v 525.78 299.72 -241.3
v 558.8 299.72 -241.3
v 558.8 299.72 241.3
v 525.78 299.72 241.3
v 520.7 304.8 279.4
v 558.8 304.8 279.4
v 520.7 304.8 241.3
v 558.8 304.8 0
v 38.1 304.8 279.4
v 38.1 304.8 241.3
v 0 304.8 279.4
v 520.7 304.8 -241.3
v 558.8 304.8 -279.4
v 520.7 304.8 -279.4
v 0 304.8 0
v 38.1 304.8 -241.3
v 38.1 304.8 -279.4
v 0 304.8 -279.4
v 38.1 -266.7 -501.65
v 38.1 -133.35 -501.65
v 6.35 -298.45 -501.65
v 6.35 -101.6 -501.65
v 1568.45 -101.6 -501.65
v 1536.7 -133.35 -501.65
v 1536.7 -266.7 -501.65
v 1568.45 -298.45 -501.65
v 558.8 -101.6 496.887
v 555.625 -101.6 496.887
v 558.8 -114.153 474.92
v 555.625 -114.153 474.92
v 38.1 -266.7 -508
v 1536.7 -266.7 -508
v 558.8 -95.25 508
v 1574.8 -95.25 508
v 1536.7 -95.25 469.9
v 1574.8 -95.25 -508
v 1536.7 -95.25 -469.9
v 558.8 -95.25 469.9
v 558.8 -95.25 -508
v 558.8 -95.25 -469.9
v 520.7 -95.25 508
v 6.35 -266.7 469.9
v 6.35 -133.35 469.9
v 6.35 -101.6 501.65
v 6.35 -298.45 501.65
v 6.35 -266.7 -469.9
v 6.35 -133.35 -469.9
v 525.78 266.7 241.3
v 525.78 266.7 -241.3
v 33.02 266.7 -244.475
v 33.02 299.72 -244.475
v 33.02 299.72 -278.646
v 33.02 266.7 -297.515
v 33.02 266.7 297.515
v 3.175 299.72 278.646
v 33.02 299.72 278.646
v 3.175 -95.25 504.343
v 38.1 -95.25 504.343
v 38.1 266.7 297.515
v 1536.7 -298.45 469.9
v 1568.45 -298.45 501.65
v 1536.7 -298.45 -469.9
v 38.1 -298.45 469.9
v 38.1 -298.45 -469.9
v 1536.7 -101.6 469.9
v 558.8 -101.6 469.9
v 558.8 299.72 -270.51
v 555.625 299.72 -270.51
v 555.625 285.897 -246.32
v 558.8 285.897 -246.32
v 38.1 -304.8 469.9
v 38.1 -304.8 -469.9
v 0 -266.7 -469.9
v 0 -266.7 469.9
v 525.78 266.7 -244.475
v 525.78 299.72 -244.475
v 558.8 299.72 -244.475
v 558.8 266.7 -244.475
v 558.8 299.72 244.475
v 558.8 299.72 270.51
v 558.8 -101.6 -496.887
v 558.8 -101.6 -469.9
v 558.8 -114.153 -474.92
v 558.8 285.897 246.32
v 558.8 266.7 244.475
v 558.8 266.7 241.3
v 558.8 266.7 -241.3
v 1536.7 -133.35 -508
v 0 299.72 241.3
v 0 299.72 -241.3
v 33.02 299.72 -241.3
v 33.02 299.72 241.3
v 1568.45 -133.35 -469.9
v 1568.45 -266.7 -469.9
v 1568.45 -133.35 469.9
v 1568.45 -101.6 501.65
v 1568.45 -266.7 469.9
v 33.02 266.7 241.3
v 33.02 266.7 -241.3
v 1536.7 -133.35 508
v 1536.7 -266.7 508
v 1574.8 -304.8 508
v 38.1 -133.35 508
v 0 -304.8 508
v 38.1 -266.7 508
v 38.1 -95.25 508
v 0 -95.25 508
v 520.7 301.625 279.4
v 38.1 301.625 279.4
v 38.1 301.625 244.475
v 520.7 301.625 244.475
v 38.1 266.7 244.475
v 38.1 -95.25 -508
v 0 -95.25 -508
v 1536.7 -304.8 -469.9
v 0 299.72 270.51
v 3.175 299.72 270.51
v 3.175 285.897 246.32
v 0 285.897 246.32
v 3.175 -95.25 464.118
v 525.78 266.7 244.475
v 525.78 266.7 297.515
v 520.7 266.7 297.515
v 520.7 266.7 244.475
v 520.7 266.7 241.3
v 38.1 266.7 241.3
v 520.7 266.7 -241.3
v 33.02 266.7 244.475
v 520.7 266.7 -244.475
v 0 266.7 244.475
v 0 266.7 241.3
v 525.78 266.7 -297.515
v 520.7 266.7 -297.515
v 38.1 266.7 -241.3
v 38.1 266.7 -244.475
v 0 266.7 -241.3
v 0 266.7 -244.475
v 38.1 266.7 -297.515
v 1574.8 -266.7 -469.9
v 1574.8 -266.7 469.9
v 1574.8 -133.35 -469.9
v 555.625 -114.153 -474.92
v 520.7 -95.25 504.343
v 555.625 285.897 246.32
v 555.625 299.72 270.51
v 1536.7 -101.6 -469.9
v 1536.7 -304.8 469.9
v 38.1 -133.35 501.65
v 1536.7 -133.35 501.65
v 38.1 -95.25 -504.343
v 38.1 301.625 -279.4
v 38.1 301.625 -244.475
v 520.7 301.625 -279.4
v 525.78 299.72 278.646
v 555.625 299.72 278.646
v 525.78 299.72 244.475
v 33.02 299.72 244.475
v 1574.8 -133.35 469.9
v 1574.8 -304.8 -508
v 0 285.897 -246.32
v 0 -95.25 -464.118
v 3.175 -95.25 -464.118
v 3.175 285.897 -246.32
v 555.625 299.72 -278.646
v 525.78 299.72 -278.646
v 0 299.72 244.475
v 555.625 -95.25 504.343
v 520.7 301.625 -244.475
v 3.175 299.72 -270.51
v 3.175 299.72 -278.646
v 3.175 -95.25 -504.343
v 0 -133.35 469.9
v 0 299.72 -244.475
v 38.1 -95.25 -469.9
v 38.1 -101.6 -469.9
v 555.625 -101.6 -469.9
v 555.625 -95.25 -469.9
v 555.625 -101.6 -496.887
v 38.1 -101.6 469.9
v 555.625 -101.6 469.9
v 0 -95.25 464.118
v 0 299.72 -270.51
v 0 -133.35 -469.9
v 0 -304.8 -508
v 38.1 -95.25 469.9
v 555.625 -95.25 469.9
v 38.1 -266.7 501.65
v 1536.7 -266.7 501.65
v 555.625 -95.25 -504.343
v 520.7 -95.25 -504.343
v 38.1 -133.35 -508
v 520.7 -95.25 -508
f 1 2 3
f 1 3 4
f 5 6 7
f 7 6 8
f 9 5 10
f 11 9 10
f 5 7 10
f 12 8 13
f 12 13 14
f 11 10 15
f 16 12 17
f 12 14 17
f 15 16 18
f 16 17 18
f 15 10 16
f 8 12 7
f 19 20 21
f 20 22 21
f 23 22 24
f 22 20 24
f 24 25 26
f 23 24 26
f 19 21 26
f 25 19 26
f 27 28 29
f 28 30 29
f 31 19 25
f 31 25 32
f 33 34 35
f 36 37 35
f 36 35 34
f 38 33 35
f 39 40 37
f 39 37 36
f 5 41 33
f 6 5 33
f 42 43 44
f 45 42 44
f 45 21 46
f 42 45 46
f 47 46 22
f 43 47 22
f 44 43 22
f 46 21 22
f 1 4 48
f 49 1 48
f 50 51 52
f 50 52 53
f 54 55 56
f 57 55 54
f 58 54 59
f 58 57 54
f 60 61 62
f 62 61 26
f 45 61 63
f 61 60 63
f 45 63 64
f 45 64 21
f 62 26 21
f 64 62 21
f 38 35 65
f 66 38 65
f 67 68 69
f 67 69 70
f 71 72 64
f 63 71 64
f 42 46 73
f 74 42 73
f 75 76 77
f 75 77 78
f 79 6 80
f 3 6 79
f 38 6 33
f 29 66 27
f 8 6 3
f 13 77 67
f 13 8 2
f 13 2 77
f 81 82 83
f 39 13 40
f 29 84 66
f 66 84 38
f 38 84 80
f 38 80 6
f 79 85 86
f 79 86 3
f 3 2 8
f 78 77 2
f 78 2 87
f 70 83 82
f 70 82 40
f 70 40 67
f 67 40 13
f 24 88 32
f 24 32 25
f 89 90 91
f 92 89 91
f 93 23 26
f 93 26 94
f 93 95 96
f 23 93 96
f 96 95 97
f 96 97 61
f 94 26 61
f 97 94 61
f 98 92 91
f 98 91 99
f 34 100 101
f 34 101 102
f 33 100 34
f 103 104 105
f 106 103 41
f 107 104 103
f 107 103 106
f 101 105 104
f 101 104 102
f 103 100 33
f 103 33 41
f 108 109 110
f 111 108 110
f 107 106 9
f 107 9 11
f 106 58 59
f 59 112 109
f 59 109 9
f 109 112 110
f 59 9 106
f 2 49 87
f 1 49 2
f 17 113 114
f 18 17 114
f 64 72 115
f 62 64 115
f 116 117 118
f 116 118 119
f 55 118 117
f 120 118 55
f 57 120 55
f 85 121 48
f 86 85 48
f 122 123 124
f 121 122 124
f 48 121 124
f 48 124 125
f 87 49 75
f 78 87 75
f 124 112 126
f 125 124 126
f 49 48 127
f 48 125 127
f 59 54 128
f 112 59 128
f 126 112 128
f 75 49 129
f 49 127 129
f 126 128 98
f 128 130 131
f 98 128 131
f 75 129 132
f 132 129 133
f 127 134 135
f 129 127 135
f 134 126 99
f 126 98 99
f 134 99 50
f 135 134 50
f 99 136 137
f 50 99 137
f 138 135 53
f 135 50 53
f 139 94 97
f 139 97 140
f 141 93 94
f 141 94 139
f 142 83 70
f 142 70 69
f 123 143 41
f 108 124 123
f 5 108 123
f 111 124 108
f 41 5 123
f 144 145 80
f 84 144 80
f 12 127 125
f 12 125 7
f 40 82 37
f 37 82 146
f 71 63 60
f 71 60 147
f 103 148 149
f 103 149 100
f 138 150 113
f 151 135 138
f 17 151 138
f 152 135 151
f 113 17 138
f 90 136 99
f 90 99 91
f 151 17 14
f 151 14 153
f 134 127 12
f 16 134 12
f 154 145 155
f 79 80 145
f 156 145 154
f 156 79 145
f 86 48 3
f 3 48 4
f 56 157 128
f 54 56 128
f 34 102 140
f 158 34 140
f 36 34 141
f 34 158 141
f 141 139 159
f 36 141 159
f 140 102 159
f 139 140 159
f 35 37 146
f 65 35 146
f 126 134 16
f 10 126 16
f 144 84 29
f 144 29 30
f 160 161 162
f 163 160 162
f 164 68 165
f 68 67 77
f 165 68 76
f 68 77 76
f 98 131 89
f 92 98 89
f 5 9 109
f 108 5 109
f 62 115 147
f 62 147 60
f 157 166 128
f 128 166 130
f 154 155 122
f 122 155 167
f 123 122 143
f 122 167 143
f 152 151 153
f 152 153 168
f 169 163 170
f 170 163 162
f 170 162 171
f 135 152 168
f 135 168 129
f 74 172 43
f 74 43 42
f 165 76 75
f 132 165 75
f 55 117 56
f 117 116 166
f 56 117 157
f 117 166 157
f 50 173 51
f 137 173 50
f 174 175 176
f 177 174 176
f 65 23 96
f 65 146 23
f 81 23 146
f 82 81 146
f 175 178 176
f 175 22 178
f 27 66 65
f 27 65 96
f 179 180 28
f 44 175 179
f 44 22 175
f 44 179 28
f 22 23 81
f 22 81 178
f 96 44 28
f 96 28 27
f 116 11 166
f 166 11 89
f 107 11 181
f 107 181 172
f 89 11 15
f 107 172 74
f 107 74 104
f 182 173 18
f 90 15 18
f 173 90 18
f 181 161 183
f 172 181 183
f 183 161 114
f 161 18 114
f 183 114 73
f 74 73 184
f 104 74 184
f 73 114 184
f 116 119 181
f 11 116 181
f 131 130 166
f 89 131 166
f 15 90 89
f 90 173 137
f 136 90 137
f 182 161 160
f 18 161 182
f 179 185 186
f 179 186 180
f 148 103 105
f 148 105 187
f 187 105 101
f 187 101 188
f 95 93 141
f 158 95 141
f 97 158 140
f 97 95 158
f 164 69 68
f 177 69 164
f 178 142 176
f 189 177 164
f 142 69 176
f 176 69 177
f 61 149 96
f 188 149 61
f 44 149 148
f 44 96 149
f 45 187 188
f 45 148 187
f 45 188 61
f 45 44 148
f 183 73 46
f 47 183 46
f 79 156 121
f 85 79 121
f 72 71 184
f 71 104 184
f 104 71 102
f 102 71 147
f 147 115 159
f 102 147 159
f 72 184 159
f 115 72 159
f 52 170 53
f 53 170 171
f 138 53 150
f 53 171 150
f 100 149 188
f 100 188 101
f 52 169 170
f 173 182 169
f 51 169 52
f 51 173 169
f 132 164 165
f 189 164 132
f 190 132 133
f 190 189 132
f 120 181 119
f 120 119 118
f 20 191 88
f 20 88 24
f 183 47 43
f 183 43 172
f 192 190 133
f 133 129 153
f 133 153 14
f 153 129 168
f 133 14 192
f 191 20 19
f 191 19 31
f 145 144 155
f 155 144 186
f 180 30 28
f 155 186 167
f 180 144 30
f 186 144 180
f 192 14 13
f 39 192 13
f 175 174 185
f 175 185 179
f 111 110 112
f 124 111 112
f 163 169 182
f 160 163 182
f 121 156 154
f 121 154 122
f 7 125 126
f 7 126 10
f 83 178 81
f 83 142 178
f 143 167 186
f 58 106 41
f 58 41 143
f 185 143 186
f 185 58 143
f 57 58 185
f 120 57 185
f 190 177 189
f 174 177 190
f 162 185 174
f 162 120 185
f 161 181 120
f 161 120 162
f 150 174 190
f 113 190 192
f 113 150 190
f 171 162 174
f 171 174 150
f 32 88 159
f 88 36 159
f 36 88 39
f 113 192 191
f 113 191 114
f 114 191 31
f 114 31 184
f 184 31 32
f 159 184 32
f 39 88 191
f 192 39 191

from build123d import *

# Parameters (mm, degrees)
BOTTOM_HORIZONTAL_ANGLE_DEPTH   = 1574.8
BOTTOM_HORIZONTAL_ANGLE_2_DEPTH = 1574.8
BOTTOM_HORIZONTAL_ANGLE_3_DEPTH = 1574.8
BOTTOM_HORIZONTAL_ANGLE_4_DEPTH = 1574.8
FRONT_VERTIAL_ANGLE_DEPTH       = 209.55
REAR_DIAGONAL_ANGLE_DEPTH       = 460.75803
REAR_TOP_ANGLE_REACH            = 510
REAR_TOP_HORIZONTAL_ANGLE_DEPTH = 558.8
BOSS_EXTRUDE9_START             = -469.9
BOSS_EXTRUDE9_DEPTH             = 939.8


with BuildPart() as part:
    # Sketch5 → Bottom Horizontal Angle (new body)
    with BuildSketch(Plane(origin=(0, 0, 0), x_dir=(0, 0, -1), z_dir=(1, 0, 0))):
        Polygon((-508, -304.8), (-508, -266.7), (-501.65, -266.7), (-501.65, -298.45), (-469.9, -298.45), (-469.9, -304.8), align=None)
    extrude(amount=BOTTOM_HORIZONTAL_ANGLE_DEPTH)



with BuildPart() as body_2:
    # Sketch5 → Bottom Horizontal Angle 2 (new body)
    with BuildSketch(Plane(origin=(0, 0, 0), x_dir=(0, 0, -1), z_dir=(1, 0, 0))):
        Polygon((501.65, -266.7), (508, -266.7), (508, -304.8), (469.9, -304.8), (469.9, -298.45), (501.65, -298.45), align=None)
    extrude(amount=BOTTOM_HORIZONTAL_ANGLE_2_DEPTH)


with BuildPart() as body_3:
    # Sketch5 → Bottom Horizontal Angle 3 (new body)
    with BuildSketch(Plane(origin=(0, 0, 0), x_dir=(0, 0, -1), z_dir=(1, 0, 0))):
        Polygon((508, -95.25), (508, -133.35), (501.65, -133.35), (501.65, -101.6), (469.9, -101.6), (469.9, -95.25), align=None)
    extrude(amount=BOTTOM_HORIZONTAL_ANGLE_3_DEPTH)


with BuildPart() as body_4:
    # Sketch5 → Bottom Horizontal Angle 4 (new body)
    with BuildSketch(Plane(origin=(0, 0, 0), x_dir=(0, 0, -1), z_dir=(1, 0, 0))):
        Polygon((-501.65, -133.35), (-508, -133.35), (-508, -95.25), (-469.9, -95.25), (-469.9, -101.6), (-501.65, -101.6), align=None)
    extrude(amount=BOTTOM_HORIZONTAL_ANGLE_4_DEPTH)


with BuildPart() as part_1:
    add(part.part)

    add(body_2.part)  # Front Vertial Angle merges body 2

    add(body_3.part)  # Front Vertial Angle merges body 3

    add(body_4.part)  # Front Vertial Angle merges body 4
    # Sketch6 → Front Vertial Angle (add)
    with BuildSketch(Plane.XZ.offset(304.8)):
        Polygon((1574.8, -508), (1536.7, -508), (1536.7, -501.65), (1568.45, -501.65), (1568.45, -469.9), (1574.8, -469.9), align=None)
        Polygon((1536.7, 501.65), (1536.7, 508), (1574.8, 508), (1574.8, 469.9), (1568.45, 469.9), (1568.45, 501.65), align=None)
        Polygon((0, 508), (38.1, 508), (38.1, 501.65), (6.35, 501.65), (6.35, 469.9), (0, 469.9), align=None)
        Polygon((38.1, -501.65), (38.1, -508), (0, -508), (0, -469.9), (6.35, -469.9), (6.35, -501.65), align=None)
    extrude(amount=-FRONT_VERTIAL_ANGLE_DEPTH)

    # Sketch13 → Rear Diagonal Angle (add)
    with BuildSketch(Plane(origin=(0, -95.25, 508), x_dir=(-1, 0, 0), z_dir=(0, -0.868243142, 0.496138938))):
        Polygon((0, 0), (0, 38.1), (-3.175, 38.1), (-3.175, 3.175), (-38.1, 3.175), (-38.1, 0), align=None)
        Polygon((-520.7, 0), (-558.8, 0), (-558.8, 38.1), (-555.625, 38.1), (-555.625, 3.175), (-520.7, 3.175), align=None)
    extrude(amount=-REAR_DIAGONAL_ANGLE_DEPTH)

    # Sketch14 → Rear Top Angle (add, up to next)
    with BuildSketch(Plane.XY, mode=Mode.PRIVATE) as rear_top_angle_sk1:
        Polygon((33.02, 266.7), (38.1, 266.7), (38.1, 304.8), (0, 304.8), (0, 299.72), (33.02, 299.72), align=None)
    rear_top_angle_tool1 = extrude(rear_top_angle_sk1.sketch, amount=REAR_TOP_ANGLE_REACH, mode=Mode.PRIVATE) - part_1.part
    add(rear_top_angle_tool1.solids().sort_by_distance((35.56, 267.238815, 0))[0])
    # Sketch14 → Rear Top Angle (add, up to next)
    with BuildSketch(Plane.XY, mode=Mode.PRIVATE) as rear_top_angle_sk2:
        Polygon((525.78, 299.72), (525.78, 266.7), (520.7, 266.7), (520.7, 304.8), (558.8, 304.8), (558.8, 299.72), align=None)
    rear_top_angle_tool2 = extrude(rear_top_angle_sk2.sketch, amount=REAR_TOP_ANGLE_REACH, mode=Mode.PRIVATE) - part_1.part
    add(rear_top_angle_tool2.solids().sort_by_distance((525.241185, 283.21, 0))[0])

    # Sketch8 → Rear Top Horizontal Angle (add)
    with BuildSketch(Plane.ZY):
        Polygon((244.475, 266.7), (241.3, 266.7), (241.3, 304.8), (279.4, 304.8), (279.4, 301.625), (244.475, 301.625), align=None)
    extrude(amount=-REAR_TOP_HORIZONTAL_ANGLE_DEPTH)

    # Sketch15 → Boss-Extrude9 (add)
    with BuildSketch(Plane.XY.offset(BOSS_EXTRUDE9_START)):
        Polygon((0, -266.7), (0, -304.8), (38.1, -304.8), (38.1, -298.45), (6.35, -298.45), (6.35, -266.7), align=None)
        Polygon((1568.45, -266.7), (1574.8, -266.7), (1574.8, -304.8), (1536.7, -304.8), (1536.7, -298.45), (1568.45, -298.45), align=None)
        Polygon((1574.8, -133.35), (1574.8, -95.25), (1536.7, -95.25), (1536.7, -101.6), (1568.45, -101.6), (1568.45, -133.35), align=None)
        Polygon((6.35, -133.35), (0, -133.35), (0, -95.25), (38.1, -95.25), (38.1, -101.6), (6.35, -101.6), align=None)
    extrude(amount=BOSS_EXTRUDE9_DEPTH)

    # Mirror 2: part across plane


with BuildPart() as part_2:
    add(part_1.part)
    add(part_1.part.mirror(Plane.XY))


solid = part_2.part
